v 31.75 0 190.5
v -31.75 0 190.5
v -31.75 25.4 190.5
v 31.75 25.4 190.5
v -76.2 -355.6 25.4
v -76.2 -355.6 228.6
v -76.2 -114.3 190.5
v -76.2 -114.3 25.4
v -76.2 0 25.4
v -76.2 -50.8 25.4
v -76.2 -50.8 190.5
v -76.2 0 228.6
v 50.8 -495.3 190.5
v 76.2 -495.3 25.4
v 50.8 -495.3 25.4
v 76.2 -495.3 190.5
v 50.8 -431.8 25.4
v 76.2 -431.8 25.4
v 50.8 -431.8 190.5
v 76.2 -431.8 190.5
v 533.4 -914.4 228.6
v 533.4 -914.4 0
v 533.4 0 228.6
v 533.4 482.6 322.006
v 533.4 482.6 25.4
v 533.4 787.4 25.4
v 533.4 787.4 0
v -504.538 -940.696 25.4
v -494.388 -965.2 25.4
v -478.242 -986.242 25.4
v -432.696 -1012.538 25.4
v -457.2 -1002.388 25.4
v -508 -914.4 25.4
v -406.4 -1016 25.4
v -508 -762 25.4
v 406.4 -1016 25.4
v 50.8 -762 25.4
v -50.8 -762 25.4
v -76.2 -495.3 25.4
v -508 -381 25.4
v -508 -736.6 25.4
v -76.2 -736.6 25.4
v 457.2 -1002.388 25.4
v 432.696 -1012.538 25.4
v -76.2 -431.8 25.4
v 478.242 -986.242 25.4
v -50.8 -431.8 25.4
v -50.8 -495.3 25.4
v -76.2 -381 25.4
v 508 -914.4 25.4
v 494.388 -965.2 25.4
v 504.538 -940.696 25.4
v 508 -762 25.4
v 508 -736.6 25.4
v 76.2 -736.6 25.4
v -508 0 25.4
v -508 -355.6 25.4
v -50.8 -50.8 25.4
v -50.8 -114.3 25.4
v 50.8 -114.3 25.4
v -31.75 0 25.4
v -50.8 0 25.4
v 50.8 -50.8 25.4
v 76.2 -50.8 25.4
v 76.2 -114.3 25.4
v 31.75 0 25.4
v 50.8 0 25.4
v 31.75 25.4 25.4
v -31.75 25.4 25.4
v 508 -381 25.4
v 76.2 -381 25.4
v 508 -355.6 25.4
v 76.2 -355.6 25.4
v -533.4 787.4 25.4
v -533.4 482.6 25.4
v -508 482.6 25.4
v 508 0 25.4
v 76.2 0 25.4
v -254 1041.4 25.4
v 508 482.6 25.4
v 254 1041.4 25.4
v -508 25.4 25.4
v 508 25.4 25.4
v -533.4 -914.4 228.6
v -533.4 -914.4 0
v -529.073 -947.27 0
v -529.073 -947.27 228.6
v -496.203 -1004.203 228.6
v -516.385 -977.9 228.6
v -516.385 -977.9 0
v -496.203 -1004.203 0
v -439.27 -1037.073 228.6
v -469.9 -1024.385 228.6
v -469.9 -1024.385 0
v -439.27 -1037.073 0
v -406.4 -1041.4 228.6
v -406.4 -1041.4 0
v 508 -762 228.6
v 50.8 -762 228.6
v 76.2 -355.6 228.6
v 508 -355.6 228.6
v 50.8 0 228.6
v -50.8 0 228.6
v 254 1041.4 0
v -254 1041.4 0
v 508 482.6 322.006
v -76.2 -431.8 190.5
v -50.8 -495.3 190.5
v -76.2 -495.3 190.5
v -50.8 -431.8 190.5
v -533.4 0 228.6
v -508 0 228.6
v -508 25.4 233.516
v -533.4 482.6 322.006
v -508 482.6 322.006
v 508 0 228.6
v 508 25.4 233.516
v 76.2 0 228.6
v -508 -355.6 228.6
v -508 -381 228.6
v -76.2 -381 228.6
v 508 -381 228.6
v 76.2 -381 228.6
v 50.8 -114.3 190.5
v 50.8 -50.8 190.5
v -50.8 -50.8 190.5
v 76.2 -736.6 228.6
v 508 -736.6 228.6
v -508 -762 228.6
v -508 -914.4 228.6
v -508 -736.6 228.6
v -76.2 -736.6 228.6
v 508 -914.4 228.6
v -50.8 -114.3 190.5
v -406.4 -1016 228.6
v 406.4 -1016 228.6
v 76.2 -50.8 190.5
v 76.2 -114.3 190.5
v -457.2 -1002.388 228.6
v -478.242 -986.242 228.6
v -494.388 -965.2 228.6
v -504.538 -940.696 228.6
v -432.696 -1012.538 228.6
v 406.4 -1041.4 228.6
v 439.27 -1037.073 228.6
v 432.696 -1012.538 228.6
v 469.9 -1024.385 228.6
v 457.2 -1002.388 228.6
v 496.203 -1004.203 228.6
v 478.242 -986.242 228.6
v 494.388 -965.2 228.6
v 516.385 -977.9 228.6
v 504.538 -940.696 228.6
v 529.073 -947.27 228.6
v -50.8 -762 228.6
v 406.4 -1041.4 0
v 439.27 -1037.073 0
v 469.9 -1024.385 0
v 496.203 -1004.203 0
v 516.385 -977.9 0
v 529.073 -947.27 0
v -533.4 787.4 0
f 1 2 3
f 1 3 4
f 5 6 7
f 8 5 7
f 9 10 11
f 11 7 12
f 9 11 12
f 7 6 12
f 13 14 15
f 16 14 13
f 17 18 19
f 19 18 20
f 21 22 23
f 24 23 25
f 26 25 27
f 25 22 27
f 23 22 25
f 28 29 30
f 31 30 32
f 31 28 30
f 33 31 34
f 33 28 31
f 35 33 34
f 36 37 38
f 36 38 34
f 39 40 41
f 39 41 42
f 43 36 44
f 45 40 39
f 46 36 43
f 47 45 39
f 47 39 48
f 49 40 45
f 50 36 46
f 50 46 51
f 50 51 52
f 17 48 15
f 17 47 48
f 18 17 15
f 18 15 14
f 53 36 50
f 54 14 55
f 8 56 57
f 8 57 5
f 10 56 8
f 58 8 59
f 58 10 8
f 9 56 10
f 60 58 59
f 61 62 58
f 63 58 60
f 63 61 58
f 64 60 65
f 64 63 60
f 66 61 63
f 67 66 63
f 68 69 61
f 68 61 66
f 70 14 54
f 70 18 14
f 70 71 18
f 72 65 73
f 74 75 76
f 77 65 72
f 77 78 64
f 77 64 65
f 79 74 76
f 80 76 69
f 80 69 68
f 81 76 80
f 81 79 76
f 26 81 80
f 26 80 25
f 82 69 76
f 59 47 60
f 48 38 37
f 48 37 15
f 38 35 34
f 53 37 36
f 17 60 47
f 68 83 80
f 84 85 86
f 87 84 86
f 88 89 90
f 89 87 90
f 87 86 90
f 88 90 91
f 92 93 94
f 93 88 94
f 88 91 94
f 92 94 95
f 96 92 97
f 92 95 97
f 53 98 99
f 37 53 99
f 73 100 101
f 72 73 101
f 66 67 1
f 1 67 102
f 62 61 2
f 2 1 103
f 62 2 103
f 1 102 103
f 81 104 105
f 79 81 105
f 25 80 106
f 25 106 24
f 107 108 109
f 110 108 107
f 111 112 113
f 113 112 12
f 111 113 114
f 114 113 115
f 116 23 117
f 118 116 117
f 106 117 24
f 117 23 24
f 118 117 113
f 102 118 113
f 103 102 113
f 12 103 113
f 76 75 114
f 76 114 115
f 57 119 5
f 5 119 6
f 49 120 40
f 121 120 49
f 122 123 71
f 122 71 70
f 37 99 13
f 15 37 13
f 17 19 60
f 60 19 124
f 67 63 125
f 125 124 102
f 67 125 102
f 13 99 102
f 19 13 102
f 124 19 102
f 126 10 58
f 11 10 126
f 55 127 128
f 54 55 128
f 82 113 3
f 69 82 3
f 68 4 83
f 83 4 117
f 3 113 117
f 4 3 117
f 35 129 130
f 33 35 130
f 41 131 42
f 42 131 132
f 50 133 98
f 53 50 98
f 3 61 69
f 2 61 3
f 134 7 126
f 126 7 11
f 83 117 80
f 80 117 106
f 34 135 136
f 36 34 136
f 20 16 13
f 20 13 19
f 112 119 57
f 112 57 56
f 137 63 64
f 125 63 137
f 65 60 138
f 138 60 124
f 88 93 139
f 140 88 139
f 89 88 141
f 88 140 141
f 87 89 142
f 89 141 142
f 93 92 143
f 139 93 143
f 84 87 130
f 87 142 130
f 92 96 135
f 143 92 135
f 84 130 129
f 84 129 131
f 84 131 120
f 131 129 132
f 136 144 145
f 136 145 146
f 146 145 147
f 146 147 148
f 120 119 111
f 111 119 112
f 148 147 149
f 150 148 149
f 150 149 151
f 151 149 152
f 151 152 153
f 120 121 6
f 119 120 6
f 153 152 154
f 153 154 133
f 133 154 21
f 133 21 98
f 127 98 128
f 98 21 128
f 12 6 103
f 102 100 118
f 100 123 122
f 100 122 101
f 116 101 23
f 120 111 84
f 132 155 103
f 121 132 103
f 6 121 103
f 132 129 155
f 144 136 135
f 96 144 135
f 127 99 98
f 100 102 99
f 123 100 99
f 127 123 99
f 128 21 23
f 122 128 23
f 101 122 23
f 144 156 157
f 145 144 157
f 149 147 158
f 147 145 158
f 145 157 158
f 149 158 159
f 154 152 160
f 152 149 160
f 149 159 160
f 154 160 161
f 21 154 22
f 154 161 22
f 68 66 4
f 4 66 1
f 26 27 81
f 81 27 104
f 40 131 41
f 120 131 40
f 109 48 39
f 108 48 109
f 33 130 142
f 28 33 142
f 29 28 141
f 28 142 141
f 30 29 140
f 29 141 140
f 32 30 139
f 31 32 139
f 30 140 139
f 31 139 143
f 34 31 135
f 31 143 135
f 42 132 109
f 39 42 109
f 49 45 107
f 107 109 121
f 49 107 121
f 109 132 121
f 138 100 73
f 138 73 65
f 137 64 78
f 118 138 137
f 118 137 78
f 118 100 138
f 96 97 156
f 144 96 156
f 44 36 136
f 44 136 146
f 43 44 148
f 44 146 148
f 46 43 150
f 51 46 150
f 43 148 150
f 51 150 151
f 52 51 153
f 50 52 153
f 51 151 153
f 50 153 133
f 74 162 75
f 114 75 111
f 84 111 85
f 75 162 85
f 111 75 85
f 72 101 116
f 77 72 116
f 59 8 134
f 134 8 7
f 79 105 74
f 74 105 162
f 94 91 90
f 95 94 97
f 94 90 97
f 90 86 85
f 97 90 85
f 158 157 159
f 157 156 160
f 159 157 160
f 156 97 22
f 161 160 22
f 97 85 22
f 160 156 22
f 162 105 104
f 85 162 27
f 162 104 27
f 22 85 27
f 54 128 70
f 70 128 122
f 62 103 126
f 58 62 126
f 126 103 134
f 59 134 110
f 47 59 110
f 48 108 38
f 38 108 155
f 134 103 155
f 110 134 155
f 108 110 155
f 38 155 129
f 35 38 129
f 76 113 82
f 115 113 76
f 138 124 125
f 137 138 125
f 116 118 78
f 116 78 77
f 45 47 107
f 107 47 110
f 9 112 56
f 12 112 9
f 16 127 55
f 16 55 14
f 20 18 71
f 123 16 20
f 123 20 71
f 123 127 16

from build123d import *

# Parameters (mm, degrees)
F1_DEPTH  = 381
F3_W      = 1016
F3_H      = 457.2
F3_W_2    = 431.8
F3_H_2    = 355.6
F4_DEPTH  = 355.6
F5_DEPTH  = 1270
F6_W      = 63.5
F6_H      = 165.1
F7_DEPTH  = 25.4
F8_W      = 63.5
F8_H      = 165.1
F9_DEPTH  = 25.4
F10_W     = 63.5
F10_H     = 165.1
F11_DEPTH = 127
F12_W     = 127
F12_H     = 177.8
F13_DEPTH = 25.4
F14_W     = 1493.888004
F14_H     = 593.896151
F15_DEPTH = 355.601


with BuildPart() as f1:
    # F0 (on Top) → F1 (new body)
    with BuildSketch(Plane.XY):
        with BuildLine():
            Line((254, 1041.4), (-254, 1041.4))
            Line((-254, 1041.4), (-533.4, 787.4))
            Line((-533.4, 787.4), (-533.4, -914.4))
            ThreePointArc((-533.4, -914.4), (-496.202561, -1004.202561), (-406.4, -1041.4))
            Line((-406.4, -1041.4), (406.4, -1041.4))
            ThreePointArc((406.4, -1041.4), (496.202561, -1004.202561), (533.4, -914.4))
            Line((533.4, -914.4), (533.4, 787.4))
            Line((533.4, 787.4), (254, 1041.4))
        make_face()
    extrude(amount=F1_DEPTH)

    # F3 (on face) → F4 (cut)
    with BuildSketch(Plane.XY.offset(381)):
        with Locations((0, 254)):
            Rectangle(F3_W, F3_H)
        Polygon((-244.180185, 1016), (-508, 776.163805), (-508, 508), (508, 508), (508, 776.163805), (244.180185, 1016), align=None)
        with Locations((-292.1, -177.8)):
            Rectangle(F3_W_2, F3_H_2)
        with Locations((292.1, -177.8)):
            Rectangle(F3_W_2, F3_H_2)
        with Locations((292.1, -558.8)):
            Rectangle(F3_W_2, F3_H_2)
        with Locations((-292.1, -558.8)):
            Rectangle(F3_W_2, F3_H_2)
        with BuildLine():
            Line((50.8, 0), (-50.8, 0))
            Line((-50.8, 0), (-50.8, -381))
            Line((-50.8, -381), (-50.8, -762))
            Line((-50.8, -762), (-508, -762))
            Line((-508, -762), (-508, -914.4))
            ThreePointArc((-508, -914.4), (-478.242049, -986.242049), (-406.4, -1016))
            Line((-406.4, -1016), (406.4, -1016))
            ThreePointArc((406.4, -1016), (478.242049, -986.242049), (508, -914.4))
            Line((508, -914.4), (508, -762))
            Line((508, -762), (50.8, -762))
            Line((50.8, -762), (50.8, -381))
            Line((50.8, -381), (50.8, 0))
        make_face()
    extrude(amount=-F4_DEPTH, mode=Mode.SUBTRACT)

    # F2 (on Right) → F5 (cut, symmetric)
    with BuildSketch(Plane.YZ):
        Polygon((-1041.4, 381), (-1041.4, 228.6), (0, 228.6), (787.4, 381), align=None)
    extrude(amount=F5_DEPTH, both=True, mode=Mode.SUBTRACT)

    # F6 (on face) → F7 (cut, through all)
    with BuildSketch(Plane.XZ.offset(-482.6)):
        with Locations((0, 107.95)):
            Rectangle(F6_W, F6_H)
    extrude(amount=-F7_DEPTH, mode=Mode.SUBTRACT)

    # F8 (on face) → F9 (cut, through all)
    with BuildSketch(Plane.XZ):
        with Locations((0, 107.95)):
            Rectangle(F8_W, F8_H)
    extrude(amount=-F9_DEPTH, mode=Mode.SUBTRACT)

    # F10 (on Right) → F11 (cut, symmetric)
    with BuildSketch(Plane.YZ):
        with Locations((-82.55, 107.95)):
            Rectangle(F10_W, F10_H)
        with Locations((-463.55, 107.95)):
            Rectangle(F10_W, F10_H)
    extrude(amount=F11_DEPTH, both=True, mode=Mode.SUBTRACT)

    # F12 (on face) → F13 (cut)
    with BuildSketch(Plane(origin=(0, 1041.4, 0), x_dir=(-1, 0, 0), z_dir=(0, 1, 0))):
        with Locations((0, 114.3)):
            Rectangle(F12_W, F12_H)
        with BuildLine():
            Line((-63.5, 203.2), (63.5, 203.2))
            ThreePointArc((63.5, 203.2), (0, 266.7), (-63.5, 203.2))
        make_face()
    extrude(amount=-F13_DEPTH, mode=Mode.SUBTRACT)

    # F14 (on face) → F15 (cut, through all)
    with BuildSketch(Plane.XY.offset(25.4)):
        with Locations((0, 779.548075)):
            Rectangle(F14_W, F14_H)
    extrude(amount=F15_DEPTH, mode=Mode.SUBTRACT)


solid = f1.part
